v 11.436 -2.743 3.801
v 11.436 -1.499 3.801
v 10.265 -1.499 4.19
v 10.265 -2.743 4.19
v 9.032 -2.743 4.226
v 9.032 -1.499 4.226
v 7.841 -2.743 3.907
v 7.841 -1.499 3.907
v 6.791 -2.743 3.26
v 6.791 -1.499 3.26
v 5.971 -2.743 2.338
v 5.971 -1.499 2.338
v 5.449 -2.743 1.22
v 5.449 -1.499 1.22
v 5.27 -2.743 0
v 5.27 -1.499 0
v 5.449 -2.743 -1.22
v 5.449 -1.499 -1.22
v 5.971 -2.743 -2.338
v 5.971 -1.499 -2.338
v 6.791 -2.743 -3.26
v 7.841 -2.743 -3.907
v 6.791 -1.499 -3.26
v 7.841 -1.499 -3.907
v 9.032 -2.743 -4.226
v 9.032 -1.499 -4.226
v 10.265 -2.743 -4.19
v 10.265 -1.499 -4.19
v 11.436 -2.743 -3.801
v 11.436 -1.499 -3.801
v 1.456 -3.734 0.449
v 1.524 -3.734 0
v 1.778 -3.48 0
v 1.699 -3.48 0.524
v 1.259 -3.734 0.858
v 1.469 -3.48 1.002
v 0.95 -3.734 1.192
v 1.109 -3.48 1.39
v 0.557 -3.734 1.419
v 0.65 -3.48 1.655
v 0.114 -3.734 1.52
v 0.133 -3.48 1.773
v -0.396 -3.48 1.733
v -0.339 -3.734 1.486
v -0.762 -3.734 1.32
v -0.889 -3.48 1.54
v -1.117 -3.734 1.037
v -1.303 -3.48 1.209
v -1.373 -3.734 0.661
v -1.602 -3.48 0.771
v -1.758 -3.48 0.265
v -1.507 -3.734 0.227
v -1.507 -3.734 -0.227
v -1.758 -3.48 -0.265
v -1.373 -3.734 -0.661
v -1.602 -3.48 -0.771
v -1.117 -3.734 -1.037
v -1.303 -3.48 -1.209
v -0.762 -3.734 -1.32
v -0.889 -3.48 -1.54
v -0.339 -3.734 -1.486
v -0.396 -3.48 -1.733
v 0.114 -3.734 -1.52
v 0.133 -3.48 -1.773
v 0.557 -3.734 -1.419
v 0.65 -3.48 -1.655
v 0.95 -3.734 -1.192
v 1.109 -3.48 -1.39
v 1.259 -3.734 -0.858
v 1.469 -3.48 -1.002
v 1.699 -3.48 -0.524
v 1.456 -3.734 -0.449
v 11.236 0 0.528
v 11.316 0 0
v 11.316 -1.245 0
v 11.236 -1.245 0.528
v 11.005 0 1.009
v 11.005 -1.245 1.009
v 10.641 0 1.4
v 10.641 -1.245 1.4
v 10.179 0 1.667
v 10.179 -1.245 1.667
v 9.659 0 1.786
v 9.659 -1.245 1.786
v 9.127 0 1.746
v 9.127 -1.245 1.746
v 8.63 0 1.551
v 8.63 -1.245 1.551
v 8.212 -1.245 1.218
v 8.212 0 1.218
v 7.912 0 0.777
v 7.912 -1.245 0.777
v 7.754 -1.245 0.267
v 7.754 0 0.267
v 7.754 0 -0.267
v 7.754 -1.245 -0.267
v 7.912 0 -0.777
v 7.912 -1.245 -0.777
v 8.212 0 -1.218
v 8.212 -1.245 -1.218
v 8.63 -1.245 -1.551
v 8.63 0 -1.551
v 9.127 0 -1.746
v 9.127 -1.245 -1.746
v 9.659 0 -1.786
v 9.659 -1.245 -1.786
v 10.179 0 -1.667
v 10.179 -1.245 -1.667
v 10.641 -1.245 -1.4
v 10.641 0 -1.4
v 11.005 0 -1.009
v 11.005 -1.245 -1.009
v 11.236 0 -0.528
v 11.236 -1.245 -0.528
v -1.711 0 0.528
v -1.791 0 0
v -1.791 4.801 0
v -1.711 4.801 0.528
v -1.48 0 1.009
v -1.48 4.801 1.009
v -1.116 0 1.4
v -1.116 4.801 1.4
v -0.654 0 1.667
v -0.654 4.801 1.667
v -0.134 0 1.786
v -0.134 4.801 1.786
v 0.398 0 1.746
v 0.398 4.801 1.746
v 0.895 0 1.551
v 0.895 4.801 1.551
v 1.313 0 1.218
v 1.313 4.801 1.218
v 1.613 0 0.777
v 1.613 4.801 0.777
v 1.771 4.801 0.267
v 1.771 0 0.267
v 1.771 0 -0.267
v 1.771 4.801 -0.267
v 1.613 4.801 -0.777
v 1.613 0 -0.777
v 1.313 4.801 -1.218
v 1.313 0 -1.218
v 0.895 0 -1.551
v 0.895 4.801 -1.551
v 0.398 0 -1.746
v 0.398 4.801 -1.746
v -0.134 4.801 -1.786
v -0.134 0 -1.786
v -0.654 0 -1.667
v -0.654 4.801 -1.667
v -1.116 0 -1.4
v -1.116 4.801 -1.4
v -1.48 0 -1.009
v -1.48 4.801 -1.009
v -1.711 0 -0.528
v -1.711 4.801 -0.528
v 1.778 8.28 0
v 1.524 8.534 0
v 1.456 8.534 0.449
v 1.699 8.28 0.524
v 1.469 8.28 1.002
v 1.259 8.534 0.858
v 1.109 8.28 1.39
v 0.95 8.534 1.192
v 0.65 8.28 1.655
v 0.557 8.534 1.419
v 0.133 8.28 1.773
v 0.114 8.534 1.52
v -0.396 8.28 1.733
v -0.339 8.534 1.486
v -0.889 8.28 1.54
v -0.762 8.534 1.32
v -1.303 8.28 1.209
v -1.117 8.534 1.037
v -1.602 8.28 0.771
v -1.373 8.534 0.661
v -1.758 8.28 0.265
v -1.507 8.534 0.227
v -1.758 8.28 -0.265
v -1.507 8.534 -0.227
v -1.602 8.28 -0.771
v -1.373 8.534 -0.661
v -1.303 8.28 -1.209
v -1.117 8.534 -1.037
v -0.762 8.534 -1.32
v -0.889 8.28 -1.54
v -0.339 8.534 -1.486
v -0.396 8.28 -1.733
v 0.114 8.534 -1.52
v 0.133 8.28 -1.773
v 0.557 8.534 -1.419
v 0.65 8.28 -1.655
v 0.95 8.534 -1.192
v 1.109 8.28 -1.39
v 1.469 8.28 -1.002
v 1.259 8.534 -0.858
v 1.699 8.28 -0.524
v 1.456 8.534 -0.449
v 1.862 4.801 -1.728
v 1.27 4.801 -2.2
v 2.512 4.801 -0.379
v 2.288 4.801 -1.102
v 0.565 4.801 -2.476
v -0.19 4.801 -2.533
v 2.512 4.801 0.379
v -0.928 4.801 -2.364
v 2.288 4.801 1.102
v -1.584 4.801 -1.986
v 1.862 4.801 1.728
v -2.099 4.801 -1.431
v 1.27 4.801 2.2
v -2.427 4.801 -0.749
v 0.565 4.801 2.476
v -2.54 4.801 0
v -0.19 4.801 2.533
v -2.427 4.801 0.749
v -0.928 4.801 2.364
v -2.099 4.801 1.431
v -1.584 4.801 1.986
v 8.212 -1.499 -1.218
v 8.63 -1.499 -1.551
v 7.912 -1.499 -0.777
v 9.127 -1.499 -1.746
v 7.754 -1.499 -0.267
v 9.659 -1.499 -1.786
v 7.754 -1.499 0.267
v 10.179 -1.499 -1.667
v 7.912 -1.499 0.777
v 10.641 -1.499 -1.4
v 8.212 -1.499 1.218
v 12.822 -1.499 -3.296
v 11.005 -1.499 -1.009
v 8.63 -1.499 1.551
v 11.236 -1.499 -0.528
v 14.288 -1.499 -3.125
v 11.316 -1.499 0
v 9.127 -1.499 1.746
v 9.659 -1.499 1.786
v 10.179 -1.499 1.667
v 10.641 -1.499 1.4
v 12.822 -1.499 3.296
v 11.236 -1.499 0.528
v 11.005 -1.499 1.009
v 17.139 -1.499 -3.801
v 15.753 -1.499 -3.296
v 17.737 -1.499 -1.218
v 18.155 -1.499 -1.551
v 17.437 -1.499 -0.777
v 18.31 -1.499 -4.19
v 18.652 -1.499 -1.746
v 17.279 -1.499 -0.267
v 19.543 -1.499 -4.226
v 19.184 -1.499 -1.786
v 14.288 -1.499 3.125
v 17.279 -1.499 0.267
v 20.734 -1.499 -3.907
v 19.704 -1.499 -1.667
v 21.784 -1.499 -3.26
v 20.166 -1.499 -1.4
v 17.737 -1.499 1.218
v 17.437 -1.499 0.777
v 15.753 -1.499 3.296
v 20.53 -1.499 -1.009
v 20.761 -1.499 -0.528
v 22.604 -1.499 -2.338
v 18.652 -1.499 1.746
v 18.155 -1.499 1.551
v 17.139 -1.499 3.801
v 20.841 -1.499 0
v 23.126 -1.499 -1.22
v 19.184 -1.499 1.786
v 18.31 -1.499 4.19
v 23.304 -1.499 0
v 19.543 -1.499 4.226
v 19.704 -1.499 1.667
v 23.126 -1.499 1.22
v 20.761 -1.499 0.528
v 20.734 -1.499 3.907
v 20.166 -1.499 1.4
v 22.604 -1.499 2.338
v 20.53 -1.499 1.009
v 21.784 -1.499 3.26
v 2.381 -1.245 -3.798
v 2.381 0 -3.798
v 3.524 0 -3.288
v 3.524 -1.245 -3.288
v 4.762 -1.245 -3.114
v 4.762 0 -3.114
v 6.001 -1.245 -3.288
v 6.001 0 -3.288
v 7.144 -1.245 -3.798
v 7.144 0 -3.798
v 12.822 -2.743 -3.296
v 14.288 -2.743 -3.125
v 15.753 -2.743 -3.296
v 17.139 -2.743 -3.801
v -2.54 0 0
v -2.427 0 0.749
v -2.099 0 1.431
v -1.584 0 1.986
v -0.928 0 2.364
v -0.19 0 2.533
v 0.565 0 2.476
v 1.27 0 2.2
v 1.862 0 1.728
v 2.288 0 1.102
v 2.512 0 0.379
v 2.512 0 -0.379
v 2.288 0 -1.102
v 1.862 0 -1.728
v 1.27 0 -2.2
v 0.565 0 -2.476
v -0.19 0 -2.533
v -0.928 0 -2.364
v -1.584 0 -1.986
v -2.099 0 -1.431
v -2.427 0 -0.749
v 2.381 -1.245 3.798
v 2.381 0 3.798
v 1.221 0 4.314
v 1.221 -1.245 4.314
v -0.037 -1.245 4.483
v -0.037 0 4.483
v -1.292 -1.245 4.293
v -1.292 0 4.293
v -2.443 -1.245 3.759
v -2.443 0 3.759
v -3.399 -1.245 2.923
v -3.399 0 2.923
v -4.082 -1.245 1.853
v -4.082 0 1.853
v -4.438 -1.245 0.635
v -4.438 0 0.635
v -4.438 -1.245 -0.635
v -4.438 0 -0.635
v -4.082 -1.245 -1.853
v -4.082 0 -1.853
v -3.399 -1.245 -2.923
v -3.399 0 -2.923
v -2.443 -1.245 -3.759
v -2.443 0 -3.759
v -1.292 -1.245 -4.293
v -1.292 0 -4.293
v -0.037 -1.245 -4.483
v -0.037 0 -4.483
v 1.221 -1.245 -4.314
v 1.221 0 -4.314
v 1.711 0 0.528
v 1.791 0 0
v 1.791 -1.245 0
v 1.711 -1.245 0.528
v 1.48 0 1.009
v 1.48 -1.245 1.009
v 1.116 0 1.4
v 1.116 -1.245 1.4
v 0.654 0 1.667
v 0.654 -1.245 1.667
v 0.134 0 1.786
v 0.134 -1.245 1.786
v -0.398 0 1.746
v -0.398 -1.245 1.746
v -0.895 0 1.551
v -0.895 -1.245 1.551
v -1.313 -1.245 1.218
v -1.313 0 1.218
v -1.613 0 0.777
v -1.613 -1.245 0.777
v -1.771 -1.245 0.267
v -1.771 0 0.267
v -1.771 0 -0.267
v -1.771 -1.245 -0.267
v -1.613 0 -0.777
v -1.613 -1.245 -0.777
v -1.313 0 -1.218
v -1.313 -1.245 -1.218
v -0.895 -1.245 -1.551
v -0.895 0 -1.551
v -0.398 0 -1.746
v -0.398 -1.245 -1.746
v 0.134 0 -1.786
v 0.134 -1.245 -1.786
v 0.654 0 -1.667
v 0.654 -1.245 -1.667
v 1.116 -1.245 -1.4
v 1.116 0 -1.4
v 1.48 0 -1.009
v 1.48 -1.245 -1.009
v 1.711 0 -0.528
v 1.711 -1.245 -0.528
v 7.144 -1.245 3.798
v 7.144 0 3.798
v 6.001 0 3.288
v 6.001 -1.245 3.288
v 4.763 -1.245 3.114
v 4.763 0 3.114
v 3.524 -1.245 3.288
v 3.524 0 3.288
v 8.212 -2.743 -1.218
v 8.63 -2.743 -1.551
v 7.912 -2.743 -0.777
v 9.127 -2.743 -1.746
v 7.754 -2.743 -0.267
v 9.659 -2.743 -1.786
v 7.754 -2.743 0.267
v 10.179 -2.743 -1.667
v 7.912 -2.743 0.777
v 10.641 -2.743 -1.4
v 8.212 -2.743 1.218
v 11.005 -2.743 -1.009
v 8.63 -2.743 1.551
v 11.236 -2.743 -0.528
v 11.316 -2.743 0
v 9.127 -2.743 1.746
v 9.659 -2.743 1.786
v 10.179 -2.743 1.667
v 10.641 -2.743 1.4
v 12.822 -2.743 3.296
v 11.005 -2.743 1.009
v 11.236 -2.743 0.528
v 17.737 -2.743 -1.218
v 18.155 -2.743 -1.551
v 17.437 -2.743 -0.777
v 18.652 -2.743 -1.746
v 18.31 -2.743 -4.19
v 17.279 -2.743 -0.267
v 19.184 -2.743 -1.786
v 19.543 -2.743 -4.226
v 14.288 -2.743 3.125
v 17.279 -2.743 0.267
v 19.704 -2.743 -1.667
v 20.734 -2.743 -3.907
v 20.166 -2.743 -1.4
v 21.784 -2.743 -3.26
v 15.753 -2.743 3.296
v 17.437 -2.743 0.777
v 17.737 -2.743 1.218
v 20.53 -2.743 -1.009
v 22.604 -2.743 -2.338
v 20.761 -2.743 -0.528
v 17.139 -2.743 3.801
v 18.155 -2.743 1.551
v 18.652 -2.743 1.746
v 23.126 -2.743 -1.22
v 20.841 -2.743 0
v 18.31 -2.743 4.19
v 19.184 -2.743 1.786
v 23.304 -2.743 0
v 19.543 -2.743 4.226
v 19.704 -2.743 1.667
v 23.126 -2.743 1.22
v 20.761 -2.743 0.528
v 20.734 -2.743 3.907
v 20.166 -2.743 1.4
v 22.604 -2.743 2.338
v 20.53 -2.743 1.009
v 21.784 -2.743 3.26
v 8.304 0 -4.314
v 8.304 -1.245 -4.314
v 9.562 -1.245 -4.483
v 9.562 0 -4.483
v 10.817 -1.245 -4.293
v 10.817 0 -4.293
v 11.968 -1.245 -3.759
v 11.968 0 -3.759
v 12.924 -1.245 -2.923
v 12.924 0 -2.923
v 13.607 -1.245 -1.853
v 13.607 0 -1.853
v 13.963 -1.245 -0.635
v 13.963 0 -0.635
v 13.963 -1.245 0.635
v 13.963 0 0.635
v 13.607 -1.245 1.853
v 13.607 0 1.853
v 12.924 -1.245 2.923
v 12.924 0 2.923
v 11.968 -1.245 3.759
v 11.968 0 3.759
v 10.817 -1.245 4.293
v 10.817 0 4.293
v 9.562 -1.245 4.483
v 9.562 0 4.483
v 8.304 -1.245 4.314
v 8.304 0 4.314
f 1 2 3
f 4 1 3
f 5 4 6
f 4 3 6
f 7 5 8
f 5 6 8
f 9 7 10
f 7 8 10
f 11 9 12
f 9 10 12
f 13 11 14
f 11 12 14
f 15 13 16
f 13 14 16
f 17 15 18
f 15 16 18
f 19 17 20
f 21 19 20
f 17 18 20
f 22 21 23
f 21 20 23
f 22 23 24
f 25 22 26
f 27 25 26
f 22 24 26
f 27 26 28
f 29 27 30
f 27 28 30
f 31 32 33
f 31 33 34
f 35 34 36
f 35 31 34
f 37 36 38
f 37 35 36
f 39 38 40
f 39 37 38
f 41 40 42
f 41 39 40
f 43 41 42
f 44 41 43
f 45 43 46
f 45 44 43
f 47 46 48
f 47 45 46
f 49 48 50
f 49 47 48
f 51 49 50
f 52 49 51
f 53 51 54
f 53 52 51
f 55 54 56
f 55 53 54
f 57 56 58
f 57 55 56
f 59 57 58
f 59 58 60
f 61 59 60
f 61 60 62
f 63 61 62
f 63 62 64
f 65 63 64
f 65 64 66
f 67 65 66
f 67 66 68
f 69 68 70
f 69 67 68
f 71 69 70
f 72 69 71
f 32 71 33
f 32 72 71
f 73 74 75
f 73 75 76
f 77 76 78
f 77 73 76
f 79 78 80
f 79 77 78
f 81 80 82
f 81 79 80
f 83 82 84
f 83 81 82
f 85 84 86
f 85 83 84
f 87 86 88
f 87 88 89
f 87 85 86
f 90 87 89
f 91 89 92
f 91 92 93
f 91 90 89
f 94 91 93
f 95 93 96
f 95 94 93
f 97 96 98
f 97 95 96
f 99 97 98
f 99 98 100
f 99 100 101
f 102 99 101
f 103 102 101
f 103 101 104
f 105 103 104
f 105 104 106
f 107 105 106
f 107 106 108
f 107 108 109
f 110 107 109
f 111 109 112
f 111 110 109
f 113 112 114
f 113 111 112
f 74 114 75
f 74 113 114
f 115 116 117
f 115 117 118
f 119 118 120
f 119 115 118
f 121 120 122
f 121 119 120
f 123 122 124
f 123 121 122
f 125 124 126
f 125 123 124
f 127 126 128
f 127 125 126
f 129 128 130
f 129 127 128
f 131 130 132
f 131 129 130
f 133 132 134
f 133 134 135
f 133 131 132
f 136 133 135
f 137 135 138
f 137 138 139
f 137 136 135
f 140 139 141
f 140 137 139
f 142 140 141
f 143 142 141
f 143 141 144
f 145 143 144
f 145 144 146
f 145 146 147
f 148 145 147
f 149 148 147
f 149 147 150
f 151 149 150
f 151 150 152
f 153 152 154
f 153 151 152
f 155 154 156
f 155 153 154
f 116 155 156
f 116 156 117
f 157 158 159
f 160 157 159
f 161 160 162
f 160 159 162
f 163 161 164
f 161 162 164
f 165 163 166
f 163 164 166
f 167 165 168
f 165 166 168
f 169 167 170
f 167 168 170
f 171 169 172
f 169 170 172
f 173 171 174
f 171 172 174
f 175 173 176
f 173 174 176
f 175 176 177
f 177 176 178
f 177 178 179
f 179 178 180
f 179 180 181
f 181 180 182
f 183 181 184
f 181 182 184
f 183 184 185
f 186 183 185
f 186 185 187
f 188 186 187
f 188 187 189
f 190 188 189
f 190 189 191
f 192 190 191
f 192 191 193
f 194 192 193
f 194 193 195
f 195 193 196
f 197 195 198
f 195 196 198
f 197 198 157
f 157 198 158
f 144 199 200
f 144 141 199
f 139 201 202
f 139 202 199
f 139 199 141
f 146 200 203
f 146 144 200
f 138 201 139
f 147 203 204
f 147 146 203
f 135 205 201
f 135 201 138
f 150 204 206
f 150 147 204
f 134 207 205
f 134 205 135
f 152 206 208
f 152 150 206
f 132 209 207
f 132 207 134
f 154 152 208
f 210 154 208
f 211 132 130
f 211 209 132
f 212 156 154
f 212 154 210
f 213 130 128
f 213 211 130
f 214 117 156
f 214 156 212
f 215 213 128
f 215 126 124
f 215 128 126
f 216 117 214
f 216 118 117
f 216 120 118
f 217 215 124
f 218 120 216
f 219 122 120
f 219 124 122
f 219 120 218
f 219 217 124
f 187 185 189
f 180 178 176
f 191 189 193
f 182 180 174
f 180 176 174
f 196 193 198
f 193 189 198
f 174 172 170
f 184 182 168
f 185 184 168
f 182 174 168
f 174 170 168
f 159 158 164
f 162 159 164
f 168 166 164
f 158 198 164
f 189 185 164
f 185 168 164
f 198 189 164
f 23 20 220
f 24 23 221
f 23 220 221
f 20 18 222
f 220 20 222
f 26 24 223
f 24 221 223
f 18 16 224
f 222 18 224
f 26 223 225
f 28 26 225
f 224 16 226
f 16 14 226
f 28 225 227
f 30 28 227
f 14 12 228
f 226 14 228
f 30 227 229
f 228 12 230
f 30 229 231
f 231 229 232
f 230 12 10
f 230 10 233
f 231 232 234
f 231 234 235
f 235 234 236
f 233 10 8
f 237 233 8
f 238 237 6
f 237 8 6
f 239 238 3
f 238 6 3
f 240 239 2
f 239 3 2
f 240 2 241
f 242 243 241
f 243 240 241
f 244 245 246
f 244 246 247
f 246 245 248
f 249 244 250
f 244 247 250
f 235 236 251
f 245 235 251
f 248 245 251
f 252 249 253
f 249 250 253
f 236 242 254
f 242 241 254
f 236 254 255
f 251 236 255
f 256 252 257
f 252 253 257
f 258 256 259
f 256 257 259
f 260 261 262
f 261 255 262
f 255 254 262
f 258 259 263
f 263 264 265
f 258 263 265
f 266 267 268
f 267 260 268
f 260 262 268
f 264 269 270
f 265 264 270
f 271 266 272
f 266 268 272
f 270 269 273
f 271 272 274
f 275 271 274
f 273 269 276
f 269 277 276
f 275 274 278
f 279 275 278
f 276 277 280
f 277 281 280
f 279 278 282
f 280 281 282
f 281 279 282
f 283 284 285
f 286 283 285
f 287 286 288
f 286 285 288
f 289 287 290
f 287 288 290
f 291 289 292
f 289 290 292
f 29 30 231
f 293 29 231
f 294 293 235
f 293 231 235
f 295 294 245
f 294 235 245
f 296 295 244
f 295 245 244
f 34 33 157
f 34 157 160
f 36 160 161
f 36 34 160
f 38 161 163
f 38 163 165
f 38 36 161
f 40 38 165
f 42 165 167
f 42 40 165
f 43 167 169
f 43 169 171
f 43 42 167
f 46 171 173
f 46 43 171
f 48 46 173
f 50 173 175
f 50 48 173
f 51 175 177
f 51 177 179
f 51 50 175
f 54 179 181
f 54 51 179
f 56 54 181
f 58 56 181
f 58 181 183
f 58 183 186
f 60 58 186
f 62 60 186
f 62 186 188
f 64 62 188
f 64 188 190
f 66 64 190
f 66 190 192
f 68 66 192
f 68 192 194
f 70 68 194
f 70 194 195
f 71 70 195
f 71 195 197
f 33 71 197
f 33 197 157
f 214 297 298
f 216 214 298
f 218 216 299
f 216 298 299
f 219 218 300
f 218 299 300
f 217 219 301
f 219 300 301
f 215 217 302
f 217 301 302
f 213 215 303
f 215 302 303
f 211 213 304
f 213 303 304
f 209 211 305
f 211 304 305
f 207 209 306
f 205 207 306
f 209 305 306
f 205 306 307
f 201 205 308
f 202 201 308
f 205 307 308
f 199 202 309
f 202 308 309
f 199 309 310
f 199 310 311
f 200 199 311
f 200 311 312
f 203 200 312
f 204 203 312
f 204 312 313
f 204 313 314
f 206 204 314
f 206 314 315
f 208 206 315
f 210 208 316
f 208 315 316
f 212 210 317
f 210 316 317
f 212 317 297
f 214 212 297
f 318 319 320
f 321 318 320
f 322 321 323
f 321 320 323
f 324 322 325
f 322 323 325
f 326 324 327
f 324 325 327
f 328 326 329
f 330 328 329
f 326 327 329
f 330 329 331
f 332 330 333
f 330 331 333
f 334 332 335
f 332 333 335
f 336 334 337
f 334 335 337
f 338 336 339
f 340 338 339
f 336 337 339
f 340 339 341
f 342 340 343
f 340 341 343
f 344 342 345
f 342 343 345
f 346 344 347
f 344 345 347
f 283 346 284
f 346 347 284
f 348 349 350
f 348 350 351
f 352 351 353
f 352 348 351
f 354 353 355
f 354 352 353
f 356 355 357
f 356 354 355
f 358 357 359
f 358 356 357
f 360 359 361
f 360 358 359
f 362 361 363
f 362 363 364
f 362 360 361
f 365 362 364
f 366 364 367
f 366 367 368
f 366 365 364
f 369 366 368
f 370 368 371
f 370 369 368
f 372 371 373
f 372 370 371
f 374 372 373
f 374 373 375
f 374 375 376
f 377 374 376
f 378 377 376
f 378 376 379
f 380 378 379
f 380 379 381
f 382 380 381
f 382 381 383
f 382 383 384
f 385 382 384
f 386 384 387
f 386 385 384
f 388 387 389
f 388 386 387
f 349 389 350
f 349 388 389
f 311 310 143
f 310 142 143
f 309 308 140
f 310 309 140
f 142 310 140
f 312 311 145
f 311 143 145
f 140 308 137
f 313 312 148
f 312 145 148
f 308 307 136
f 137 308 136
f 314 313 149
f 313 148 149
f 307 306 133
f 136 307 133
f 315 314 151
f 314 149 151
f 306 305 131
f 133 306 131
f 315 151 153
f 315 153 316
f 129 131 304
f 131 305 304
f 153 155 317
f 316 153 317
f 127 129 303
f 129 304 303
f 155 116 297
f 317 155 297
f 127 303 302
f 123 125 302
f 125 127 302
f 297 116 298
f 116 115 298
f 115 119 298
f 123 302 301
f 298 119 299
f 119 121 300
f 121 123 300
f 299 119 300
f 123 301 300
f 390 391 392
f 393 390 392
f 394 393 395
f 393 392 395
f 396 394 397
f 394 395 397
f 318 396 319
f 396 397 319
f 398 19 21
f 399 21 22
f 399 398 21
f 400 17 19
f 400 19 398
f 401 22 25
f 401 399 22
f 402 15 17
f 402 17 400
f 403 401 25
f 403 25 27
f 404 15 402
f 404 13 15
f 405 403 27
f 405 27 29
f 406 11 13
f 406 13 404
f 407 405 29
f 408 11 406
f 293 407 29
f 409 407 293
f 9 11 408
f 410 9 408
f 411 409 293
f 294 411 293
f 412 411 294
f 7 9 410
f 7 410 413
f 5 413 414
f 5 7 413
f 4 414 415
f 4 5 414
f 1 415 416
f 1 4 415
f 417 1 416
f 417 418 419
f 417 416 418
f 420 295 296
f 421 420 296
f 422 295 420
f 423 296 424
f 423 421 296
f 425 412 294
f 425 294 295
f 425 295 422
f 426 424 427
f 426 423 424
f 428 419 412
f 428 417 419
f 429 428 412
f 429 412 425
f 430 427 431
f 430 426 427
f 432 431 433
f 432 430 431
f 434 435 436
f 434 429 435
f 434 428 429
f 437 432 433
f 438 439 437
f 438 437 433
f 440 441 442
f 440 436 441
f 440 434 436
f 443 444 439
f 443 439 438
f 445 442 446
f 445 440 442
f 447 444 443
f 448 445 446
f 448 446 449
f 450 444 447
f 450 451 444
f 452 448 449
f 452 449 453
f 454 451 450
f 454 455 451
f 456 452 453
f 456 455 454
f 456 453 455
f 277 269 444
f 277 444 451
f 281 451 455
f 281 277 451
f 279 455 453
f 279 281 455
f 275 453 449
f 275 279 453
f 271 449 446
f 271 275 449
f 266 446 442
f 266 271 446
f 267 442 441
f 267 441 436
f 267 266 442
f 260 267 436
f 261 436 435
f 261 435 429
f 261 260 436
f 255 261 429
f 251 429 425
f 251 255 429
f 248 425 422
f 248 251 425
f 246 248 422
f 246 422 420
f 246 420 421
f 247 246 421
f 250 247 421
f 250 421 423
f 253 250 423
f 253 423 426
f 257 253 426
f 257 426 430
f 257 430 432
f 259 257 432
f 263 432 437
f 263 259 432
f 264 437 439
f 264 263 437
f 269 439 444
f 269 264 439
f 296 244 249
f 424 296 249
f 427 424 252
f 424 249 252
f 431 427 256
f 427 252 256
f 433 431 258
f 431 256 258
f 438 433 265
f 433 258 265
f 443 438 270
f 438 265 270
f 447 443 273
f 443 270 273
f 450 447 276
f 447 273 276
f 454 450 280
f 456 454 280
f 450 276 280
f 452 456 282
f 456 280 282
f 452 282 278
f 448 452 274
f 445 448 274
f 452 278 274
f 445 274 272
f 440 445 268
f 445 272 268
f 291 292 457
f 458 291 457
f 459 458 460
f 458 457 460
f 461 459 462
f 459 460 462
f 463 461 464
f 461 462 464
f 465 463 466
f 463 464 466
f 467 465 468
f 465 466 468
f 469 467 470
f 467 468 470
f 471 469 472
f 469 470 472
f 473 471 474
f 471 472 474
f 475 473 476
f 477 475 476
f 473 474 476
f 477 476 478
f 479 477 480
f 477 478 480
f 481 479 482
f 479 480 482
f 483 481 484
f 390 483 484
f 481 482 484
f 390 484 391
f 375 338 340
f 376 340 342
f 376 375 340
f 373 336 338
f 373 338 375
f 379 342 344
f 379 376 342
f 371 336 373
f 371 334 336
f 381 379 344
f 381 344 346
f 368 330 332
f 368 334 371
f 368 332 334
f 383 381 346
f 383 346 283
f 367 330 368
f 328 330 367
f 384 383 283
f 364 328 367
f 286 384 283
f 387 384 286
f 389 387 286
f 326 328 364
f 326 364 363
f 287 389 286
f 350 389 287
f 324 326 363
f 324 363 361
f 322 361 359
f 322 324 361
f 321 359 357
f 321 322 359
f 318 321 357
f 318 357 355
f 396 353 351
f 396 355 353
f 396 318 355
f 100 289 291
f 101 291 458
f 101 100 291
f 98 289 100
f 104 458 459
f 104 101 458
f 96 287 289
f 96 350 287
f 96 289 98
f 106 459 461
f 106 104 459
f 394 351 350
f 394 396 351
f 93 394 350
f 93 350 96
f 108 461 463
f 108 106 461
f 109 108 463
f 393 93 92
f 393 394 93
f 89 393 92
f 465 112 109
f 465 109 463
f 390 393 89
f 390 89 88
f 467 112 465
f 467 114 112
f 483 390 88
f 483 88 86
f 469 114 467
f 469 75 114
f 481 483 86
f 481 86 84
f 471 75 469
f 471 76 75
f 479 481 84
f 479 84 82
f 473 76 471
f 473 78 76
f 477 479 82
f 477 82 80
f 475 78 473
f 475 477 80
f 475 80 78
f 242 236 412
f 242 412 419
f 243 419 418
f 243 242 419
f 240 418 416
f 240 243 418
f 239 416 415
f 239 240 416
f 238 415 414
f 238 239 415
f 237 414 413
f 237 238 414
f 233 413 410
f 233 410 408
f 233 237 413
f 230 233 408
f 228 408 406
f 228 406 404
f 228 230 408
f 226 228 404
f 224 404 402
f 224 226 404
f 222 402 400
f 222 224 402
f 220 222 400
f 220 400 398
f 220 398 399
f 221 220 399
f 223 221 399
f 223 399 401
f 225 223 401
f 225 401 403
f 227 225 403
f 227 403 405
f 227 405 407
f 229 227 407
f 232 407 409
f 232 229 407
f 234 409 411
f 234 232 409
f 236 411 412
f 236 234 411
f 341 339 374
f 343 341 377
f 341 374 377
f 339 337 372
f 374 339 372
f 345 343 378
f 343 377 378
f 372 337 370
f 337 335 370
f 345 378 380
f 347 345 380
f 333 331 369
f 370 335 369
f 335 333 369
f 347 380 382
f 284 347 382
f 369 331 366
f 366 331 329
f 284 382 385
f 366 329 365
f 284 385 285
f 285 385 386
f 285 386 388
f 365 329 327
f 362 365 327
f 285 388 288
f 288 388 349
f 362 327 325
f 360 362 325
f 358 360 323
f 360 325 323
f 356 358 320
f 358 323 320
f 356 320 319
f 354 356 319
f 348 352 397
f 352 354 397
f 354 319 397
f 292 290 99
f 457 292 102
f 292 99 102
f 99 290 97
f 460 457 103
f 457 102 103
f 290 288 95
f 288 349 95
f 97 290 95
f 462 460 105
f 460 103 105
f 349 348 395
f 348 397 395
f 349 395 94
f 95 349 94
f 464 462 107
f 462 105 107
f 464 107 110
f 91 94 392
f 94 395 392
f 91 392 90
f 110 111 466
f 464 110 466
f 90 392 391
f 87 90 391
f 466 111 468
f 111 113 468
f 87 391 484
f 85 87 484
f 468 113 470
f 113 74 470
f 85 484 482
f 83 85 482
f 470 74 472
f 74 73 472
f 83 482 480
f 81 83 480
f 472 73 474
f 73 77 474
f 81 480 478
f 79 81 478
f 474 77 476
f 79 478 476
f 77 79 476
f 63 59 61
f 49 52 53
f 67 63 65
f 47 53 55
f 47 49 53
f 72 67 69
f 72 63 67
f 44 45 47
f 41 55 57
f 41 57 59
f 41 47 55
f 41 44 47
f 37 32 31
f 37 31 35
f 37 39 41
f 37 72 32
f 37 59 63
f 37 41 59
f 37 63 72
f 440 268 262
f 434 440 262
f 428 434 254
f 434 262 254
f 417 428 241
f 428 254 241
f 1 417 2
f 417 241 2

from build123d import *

# Parameters (mm, degrees)
F0_R      = 1.7907
F1_DEPTH  = 1.2446
F2_R      = 2.54
F2_R_2    = 1.7907
F3_DEPTH  = 4.8006
F6_R      = 1.778
F7_DEPTH  = 6.1341
F8_SIZE   = 0.254
F10_R     = 1.7907
F11_DEPTH = 1.2446


with BuildPart() as f1:
    # F0 (on Front) → F1 (new body)
    with BuildSketch(Plane.XZ):
        with BuildLine():
            ThreePointArc((7.14375, 3.7983988795), (4.7625, 3.1136977589), (2.38125, 3.7983988795))
            ThreePointArc((2.38125, 3.7983988795), (-4.4831, 0), (2.38125, -3.7983988795))
            ThreePointArc((2.38125, -3.7983988795), (4.7625, -3.1136977589), (7.14375, -3.7983988795))
            ThreePointArc((7.14375, -3.7983988795), (14.0081, 0), (7.14375, 3.7983988795))
        make_face()
        Circle(F0_R, mode=Mode.SUBTRACT)
        with Locations((9.525, 0)):
            Circle(F0_R, mode=Mode.SUBTRACT)
    extrude(amount=F1_DEPTH)


with BuildPart() as f3:
    # F2 (on face) → F3 (new body)
    with BuildSketch(Plane(origin=(0, 0, 0), x_dir=(-1, 0, 0), z_dir=(0, 1, 0))):
        Circle(F2_R)
        Circle(F2_R_2, mode=Mode.SUBTRACT)
    extrude(amount=F3_DEPTH)


with BuildPart() as f7:
    # F6 (on plane+point) → F7 (new body, symmetric)
    with BuildSketch(Plane.XZ.offset(-2.4003)):
        Circle(F6_R)
    extrude(amount=F7_DEPTH, both=True)

    # F8
    f8_edges = [f7.edges().sort_by_distance(p)[0] for p in [
        (-1.778, -3.7338, 0),
        (-1.778, 8.5344, 0),
    ]]
    chamfer(f8_edges, length=F8_SIZE)


with BuildPart() as f11:
    # F10 (on offset) → F11 (new body)
    with BuildSketch(Plane.XZ.offset(1.4986)):
        with BuildLine():
            ThreePointArc((17.1392964072, 3.8013131981), (14.2875, 3.1249149864), (11.4357035928, 3.8013131981))
            ThreePointArc((11.4357035928, 3.8013131981), (5.2705, 0), (11.4357035928, -3.8013131981))
            ThreePointArc((11.4357035928, -3.8013131981), (14.2875, -3.1249149864), (17.1392964072, -3.8013131981))
            ThreePointArc((17.1392964072, -3.8013131981), (23.3045, 0), (17.1392964072, 3.8013131981))
        make_face()
        with Locations((9.525, 0)):
            Circle(F10_R, mode=Mode.SUBTRACT)
        with Locations((19.05, 0)):
            Circle(F10_R, mode=Mode.SUBTRACT)
    extrude(amount=F11_DEPTH)


solid = Compound([f1.part, f3.part, f7.part, f11.part])
